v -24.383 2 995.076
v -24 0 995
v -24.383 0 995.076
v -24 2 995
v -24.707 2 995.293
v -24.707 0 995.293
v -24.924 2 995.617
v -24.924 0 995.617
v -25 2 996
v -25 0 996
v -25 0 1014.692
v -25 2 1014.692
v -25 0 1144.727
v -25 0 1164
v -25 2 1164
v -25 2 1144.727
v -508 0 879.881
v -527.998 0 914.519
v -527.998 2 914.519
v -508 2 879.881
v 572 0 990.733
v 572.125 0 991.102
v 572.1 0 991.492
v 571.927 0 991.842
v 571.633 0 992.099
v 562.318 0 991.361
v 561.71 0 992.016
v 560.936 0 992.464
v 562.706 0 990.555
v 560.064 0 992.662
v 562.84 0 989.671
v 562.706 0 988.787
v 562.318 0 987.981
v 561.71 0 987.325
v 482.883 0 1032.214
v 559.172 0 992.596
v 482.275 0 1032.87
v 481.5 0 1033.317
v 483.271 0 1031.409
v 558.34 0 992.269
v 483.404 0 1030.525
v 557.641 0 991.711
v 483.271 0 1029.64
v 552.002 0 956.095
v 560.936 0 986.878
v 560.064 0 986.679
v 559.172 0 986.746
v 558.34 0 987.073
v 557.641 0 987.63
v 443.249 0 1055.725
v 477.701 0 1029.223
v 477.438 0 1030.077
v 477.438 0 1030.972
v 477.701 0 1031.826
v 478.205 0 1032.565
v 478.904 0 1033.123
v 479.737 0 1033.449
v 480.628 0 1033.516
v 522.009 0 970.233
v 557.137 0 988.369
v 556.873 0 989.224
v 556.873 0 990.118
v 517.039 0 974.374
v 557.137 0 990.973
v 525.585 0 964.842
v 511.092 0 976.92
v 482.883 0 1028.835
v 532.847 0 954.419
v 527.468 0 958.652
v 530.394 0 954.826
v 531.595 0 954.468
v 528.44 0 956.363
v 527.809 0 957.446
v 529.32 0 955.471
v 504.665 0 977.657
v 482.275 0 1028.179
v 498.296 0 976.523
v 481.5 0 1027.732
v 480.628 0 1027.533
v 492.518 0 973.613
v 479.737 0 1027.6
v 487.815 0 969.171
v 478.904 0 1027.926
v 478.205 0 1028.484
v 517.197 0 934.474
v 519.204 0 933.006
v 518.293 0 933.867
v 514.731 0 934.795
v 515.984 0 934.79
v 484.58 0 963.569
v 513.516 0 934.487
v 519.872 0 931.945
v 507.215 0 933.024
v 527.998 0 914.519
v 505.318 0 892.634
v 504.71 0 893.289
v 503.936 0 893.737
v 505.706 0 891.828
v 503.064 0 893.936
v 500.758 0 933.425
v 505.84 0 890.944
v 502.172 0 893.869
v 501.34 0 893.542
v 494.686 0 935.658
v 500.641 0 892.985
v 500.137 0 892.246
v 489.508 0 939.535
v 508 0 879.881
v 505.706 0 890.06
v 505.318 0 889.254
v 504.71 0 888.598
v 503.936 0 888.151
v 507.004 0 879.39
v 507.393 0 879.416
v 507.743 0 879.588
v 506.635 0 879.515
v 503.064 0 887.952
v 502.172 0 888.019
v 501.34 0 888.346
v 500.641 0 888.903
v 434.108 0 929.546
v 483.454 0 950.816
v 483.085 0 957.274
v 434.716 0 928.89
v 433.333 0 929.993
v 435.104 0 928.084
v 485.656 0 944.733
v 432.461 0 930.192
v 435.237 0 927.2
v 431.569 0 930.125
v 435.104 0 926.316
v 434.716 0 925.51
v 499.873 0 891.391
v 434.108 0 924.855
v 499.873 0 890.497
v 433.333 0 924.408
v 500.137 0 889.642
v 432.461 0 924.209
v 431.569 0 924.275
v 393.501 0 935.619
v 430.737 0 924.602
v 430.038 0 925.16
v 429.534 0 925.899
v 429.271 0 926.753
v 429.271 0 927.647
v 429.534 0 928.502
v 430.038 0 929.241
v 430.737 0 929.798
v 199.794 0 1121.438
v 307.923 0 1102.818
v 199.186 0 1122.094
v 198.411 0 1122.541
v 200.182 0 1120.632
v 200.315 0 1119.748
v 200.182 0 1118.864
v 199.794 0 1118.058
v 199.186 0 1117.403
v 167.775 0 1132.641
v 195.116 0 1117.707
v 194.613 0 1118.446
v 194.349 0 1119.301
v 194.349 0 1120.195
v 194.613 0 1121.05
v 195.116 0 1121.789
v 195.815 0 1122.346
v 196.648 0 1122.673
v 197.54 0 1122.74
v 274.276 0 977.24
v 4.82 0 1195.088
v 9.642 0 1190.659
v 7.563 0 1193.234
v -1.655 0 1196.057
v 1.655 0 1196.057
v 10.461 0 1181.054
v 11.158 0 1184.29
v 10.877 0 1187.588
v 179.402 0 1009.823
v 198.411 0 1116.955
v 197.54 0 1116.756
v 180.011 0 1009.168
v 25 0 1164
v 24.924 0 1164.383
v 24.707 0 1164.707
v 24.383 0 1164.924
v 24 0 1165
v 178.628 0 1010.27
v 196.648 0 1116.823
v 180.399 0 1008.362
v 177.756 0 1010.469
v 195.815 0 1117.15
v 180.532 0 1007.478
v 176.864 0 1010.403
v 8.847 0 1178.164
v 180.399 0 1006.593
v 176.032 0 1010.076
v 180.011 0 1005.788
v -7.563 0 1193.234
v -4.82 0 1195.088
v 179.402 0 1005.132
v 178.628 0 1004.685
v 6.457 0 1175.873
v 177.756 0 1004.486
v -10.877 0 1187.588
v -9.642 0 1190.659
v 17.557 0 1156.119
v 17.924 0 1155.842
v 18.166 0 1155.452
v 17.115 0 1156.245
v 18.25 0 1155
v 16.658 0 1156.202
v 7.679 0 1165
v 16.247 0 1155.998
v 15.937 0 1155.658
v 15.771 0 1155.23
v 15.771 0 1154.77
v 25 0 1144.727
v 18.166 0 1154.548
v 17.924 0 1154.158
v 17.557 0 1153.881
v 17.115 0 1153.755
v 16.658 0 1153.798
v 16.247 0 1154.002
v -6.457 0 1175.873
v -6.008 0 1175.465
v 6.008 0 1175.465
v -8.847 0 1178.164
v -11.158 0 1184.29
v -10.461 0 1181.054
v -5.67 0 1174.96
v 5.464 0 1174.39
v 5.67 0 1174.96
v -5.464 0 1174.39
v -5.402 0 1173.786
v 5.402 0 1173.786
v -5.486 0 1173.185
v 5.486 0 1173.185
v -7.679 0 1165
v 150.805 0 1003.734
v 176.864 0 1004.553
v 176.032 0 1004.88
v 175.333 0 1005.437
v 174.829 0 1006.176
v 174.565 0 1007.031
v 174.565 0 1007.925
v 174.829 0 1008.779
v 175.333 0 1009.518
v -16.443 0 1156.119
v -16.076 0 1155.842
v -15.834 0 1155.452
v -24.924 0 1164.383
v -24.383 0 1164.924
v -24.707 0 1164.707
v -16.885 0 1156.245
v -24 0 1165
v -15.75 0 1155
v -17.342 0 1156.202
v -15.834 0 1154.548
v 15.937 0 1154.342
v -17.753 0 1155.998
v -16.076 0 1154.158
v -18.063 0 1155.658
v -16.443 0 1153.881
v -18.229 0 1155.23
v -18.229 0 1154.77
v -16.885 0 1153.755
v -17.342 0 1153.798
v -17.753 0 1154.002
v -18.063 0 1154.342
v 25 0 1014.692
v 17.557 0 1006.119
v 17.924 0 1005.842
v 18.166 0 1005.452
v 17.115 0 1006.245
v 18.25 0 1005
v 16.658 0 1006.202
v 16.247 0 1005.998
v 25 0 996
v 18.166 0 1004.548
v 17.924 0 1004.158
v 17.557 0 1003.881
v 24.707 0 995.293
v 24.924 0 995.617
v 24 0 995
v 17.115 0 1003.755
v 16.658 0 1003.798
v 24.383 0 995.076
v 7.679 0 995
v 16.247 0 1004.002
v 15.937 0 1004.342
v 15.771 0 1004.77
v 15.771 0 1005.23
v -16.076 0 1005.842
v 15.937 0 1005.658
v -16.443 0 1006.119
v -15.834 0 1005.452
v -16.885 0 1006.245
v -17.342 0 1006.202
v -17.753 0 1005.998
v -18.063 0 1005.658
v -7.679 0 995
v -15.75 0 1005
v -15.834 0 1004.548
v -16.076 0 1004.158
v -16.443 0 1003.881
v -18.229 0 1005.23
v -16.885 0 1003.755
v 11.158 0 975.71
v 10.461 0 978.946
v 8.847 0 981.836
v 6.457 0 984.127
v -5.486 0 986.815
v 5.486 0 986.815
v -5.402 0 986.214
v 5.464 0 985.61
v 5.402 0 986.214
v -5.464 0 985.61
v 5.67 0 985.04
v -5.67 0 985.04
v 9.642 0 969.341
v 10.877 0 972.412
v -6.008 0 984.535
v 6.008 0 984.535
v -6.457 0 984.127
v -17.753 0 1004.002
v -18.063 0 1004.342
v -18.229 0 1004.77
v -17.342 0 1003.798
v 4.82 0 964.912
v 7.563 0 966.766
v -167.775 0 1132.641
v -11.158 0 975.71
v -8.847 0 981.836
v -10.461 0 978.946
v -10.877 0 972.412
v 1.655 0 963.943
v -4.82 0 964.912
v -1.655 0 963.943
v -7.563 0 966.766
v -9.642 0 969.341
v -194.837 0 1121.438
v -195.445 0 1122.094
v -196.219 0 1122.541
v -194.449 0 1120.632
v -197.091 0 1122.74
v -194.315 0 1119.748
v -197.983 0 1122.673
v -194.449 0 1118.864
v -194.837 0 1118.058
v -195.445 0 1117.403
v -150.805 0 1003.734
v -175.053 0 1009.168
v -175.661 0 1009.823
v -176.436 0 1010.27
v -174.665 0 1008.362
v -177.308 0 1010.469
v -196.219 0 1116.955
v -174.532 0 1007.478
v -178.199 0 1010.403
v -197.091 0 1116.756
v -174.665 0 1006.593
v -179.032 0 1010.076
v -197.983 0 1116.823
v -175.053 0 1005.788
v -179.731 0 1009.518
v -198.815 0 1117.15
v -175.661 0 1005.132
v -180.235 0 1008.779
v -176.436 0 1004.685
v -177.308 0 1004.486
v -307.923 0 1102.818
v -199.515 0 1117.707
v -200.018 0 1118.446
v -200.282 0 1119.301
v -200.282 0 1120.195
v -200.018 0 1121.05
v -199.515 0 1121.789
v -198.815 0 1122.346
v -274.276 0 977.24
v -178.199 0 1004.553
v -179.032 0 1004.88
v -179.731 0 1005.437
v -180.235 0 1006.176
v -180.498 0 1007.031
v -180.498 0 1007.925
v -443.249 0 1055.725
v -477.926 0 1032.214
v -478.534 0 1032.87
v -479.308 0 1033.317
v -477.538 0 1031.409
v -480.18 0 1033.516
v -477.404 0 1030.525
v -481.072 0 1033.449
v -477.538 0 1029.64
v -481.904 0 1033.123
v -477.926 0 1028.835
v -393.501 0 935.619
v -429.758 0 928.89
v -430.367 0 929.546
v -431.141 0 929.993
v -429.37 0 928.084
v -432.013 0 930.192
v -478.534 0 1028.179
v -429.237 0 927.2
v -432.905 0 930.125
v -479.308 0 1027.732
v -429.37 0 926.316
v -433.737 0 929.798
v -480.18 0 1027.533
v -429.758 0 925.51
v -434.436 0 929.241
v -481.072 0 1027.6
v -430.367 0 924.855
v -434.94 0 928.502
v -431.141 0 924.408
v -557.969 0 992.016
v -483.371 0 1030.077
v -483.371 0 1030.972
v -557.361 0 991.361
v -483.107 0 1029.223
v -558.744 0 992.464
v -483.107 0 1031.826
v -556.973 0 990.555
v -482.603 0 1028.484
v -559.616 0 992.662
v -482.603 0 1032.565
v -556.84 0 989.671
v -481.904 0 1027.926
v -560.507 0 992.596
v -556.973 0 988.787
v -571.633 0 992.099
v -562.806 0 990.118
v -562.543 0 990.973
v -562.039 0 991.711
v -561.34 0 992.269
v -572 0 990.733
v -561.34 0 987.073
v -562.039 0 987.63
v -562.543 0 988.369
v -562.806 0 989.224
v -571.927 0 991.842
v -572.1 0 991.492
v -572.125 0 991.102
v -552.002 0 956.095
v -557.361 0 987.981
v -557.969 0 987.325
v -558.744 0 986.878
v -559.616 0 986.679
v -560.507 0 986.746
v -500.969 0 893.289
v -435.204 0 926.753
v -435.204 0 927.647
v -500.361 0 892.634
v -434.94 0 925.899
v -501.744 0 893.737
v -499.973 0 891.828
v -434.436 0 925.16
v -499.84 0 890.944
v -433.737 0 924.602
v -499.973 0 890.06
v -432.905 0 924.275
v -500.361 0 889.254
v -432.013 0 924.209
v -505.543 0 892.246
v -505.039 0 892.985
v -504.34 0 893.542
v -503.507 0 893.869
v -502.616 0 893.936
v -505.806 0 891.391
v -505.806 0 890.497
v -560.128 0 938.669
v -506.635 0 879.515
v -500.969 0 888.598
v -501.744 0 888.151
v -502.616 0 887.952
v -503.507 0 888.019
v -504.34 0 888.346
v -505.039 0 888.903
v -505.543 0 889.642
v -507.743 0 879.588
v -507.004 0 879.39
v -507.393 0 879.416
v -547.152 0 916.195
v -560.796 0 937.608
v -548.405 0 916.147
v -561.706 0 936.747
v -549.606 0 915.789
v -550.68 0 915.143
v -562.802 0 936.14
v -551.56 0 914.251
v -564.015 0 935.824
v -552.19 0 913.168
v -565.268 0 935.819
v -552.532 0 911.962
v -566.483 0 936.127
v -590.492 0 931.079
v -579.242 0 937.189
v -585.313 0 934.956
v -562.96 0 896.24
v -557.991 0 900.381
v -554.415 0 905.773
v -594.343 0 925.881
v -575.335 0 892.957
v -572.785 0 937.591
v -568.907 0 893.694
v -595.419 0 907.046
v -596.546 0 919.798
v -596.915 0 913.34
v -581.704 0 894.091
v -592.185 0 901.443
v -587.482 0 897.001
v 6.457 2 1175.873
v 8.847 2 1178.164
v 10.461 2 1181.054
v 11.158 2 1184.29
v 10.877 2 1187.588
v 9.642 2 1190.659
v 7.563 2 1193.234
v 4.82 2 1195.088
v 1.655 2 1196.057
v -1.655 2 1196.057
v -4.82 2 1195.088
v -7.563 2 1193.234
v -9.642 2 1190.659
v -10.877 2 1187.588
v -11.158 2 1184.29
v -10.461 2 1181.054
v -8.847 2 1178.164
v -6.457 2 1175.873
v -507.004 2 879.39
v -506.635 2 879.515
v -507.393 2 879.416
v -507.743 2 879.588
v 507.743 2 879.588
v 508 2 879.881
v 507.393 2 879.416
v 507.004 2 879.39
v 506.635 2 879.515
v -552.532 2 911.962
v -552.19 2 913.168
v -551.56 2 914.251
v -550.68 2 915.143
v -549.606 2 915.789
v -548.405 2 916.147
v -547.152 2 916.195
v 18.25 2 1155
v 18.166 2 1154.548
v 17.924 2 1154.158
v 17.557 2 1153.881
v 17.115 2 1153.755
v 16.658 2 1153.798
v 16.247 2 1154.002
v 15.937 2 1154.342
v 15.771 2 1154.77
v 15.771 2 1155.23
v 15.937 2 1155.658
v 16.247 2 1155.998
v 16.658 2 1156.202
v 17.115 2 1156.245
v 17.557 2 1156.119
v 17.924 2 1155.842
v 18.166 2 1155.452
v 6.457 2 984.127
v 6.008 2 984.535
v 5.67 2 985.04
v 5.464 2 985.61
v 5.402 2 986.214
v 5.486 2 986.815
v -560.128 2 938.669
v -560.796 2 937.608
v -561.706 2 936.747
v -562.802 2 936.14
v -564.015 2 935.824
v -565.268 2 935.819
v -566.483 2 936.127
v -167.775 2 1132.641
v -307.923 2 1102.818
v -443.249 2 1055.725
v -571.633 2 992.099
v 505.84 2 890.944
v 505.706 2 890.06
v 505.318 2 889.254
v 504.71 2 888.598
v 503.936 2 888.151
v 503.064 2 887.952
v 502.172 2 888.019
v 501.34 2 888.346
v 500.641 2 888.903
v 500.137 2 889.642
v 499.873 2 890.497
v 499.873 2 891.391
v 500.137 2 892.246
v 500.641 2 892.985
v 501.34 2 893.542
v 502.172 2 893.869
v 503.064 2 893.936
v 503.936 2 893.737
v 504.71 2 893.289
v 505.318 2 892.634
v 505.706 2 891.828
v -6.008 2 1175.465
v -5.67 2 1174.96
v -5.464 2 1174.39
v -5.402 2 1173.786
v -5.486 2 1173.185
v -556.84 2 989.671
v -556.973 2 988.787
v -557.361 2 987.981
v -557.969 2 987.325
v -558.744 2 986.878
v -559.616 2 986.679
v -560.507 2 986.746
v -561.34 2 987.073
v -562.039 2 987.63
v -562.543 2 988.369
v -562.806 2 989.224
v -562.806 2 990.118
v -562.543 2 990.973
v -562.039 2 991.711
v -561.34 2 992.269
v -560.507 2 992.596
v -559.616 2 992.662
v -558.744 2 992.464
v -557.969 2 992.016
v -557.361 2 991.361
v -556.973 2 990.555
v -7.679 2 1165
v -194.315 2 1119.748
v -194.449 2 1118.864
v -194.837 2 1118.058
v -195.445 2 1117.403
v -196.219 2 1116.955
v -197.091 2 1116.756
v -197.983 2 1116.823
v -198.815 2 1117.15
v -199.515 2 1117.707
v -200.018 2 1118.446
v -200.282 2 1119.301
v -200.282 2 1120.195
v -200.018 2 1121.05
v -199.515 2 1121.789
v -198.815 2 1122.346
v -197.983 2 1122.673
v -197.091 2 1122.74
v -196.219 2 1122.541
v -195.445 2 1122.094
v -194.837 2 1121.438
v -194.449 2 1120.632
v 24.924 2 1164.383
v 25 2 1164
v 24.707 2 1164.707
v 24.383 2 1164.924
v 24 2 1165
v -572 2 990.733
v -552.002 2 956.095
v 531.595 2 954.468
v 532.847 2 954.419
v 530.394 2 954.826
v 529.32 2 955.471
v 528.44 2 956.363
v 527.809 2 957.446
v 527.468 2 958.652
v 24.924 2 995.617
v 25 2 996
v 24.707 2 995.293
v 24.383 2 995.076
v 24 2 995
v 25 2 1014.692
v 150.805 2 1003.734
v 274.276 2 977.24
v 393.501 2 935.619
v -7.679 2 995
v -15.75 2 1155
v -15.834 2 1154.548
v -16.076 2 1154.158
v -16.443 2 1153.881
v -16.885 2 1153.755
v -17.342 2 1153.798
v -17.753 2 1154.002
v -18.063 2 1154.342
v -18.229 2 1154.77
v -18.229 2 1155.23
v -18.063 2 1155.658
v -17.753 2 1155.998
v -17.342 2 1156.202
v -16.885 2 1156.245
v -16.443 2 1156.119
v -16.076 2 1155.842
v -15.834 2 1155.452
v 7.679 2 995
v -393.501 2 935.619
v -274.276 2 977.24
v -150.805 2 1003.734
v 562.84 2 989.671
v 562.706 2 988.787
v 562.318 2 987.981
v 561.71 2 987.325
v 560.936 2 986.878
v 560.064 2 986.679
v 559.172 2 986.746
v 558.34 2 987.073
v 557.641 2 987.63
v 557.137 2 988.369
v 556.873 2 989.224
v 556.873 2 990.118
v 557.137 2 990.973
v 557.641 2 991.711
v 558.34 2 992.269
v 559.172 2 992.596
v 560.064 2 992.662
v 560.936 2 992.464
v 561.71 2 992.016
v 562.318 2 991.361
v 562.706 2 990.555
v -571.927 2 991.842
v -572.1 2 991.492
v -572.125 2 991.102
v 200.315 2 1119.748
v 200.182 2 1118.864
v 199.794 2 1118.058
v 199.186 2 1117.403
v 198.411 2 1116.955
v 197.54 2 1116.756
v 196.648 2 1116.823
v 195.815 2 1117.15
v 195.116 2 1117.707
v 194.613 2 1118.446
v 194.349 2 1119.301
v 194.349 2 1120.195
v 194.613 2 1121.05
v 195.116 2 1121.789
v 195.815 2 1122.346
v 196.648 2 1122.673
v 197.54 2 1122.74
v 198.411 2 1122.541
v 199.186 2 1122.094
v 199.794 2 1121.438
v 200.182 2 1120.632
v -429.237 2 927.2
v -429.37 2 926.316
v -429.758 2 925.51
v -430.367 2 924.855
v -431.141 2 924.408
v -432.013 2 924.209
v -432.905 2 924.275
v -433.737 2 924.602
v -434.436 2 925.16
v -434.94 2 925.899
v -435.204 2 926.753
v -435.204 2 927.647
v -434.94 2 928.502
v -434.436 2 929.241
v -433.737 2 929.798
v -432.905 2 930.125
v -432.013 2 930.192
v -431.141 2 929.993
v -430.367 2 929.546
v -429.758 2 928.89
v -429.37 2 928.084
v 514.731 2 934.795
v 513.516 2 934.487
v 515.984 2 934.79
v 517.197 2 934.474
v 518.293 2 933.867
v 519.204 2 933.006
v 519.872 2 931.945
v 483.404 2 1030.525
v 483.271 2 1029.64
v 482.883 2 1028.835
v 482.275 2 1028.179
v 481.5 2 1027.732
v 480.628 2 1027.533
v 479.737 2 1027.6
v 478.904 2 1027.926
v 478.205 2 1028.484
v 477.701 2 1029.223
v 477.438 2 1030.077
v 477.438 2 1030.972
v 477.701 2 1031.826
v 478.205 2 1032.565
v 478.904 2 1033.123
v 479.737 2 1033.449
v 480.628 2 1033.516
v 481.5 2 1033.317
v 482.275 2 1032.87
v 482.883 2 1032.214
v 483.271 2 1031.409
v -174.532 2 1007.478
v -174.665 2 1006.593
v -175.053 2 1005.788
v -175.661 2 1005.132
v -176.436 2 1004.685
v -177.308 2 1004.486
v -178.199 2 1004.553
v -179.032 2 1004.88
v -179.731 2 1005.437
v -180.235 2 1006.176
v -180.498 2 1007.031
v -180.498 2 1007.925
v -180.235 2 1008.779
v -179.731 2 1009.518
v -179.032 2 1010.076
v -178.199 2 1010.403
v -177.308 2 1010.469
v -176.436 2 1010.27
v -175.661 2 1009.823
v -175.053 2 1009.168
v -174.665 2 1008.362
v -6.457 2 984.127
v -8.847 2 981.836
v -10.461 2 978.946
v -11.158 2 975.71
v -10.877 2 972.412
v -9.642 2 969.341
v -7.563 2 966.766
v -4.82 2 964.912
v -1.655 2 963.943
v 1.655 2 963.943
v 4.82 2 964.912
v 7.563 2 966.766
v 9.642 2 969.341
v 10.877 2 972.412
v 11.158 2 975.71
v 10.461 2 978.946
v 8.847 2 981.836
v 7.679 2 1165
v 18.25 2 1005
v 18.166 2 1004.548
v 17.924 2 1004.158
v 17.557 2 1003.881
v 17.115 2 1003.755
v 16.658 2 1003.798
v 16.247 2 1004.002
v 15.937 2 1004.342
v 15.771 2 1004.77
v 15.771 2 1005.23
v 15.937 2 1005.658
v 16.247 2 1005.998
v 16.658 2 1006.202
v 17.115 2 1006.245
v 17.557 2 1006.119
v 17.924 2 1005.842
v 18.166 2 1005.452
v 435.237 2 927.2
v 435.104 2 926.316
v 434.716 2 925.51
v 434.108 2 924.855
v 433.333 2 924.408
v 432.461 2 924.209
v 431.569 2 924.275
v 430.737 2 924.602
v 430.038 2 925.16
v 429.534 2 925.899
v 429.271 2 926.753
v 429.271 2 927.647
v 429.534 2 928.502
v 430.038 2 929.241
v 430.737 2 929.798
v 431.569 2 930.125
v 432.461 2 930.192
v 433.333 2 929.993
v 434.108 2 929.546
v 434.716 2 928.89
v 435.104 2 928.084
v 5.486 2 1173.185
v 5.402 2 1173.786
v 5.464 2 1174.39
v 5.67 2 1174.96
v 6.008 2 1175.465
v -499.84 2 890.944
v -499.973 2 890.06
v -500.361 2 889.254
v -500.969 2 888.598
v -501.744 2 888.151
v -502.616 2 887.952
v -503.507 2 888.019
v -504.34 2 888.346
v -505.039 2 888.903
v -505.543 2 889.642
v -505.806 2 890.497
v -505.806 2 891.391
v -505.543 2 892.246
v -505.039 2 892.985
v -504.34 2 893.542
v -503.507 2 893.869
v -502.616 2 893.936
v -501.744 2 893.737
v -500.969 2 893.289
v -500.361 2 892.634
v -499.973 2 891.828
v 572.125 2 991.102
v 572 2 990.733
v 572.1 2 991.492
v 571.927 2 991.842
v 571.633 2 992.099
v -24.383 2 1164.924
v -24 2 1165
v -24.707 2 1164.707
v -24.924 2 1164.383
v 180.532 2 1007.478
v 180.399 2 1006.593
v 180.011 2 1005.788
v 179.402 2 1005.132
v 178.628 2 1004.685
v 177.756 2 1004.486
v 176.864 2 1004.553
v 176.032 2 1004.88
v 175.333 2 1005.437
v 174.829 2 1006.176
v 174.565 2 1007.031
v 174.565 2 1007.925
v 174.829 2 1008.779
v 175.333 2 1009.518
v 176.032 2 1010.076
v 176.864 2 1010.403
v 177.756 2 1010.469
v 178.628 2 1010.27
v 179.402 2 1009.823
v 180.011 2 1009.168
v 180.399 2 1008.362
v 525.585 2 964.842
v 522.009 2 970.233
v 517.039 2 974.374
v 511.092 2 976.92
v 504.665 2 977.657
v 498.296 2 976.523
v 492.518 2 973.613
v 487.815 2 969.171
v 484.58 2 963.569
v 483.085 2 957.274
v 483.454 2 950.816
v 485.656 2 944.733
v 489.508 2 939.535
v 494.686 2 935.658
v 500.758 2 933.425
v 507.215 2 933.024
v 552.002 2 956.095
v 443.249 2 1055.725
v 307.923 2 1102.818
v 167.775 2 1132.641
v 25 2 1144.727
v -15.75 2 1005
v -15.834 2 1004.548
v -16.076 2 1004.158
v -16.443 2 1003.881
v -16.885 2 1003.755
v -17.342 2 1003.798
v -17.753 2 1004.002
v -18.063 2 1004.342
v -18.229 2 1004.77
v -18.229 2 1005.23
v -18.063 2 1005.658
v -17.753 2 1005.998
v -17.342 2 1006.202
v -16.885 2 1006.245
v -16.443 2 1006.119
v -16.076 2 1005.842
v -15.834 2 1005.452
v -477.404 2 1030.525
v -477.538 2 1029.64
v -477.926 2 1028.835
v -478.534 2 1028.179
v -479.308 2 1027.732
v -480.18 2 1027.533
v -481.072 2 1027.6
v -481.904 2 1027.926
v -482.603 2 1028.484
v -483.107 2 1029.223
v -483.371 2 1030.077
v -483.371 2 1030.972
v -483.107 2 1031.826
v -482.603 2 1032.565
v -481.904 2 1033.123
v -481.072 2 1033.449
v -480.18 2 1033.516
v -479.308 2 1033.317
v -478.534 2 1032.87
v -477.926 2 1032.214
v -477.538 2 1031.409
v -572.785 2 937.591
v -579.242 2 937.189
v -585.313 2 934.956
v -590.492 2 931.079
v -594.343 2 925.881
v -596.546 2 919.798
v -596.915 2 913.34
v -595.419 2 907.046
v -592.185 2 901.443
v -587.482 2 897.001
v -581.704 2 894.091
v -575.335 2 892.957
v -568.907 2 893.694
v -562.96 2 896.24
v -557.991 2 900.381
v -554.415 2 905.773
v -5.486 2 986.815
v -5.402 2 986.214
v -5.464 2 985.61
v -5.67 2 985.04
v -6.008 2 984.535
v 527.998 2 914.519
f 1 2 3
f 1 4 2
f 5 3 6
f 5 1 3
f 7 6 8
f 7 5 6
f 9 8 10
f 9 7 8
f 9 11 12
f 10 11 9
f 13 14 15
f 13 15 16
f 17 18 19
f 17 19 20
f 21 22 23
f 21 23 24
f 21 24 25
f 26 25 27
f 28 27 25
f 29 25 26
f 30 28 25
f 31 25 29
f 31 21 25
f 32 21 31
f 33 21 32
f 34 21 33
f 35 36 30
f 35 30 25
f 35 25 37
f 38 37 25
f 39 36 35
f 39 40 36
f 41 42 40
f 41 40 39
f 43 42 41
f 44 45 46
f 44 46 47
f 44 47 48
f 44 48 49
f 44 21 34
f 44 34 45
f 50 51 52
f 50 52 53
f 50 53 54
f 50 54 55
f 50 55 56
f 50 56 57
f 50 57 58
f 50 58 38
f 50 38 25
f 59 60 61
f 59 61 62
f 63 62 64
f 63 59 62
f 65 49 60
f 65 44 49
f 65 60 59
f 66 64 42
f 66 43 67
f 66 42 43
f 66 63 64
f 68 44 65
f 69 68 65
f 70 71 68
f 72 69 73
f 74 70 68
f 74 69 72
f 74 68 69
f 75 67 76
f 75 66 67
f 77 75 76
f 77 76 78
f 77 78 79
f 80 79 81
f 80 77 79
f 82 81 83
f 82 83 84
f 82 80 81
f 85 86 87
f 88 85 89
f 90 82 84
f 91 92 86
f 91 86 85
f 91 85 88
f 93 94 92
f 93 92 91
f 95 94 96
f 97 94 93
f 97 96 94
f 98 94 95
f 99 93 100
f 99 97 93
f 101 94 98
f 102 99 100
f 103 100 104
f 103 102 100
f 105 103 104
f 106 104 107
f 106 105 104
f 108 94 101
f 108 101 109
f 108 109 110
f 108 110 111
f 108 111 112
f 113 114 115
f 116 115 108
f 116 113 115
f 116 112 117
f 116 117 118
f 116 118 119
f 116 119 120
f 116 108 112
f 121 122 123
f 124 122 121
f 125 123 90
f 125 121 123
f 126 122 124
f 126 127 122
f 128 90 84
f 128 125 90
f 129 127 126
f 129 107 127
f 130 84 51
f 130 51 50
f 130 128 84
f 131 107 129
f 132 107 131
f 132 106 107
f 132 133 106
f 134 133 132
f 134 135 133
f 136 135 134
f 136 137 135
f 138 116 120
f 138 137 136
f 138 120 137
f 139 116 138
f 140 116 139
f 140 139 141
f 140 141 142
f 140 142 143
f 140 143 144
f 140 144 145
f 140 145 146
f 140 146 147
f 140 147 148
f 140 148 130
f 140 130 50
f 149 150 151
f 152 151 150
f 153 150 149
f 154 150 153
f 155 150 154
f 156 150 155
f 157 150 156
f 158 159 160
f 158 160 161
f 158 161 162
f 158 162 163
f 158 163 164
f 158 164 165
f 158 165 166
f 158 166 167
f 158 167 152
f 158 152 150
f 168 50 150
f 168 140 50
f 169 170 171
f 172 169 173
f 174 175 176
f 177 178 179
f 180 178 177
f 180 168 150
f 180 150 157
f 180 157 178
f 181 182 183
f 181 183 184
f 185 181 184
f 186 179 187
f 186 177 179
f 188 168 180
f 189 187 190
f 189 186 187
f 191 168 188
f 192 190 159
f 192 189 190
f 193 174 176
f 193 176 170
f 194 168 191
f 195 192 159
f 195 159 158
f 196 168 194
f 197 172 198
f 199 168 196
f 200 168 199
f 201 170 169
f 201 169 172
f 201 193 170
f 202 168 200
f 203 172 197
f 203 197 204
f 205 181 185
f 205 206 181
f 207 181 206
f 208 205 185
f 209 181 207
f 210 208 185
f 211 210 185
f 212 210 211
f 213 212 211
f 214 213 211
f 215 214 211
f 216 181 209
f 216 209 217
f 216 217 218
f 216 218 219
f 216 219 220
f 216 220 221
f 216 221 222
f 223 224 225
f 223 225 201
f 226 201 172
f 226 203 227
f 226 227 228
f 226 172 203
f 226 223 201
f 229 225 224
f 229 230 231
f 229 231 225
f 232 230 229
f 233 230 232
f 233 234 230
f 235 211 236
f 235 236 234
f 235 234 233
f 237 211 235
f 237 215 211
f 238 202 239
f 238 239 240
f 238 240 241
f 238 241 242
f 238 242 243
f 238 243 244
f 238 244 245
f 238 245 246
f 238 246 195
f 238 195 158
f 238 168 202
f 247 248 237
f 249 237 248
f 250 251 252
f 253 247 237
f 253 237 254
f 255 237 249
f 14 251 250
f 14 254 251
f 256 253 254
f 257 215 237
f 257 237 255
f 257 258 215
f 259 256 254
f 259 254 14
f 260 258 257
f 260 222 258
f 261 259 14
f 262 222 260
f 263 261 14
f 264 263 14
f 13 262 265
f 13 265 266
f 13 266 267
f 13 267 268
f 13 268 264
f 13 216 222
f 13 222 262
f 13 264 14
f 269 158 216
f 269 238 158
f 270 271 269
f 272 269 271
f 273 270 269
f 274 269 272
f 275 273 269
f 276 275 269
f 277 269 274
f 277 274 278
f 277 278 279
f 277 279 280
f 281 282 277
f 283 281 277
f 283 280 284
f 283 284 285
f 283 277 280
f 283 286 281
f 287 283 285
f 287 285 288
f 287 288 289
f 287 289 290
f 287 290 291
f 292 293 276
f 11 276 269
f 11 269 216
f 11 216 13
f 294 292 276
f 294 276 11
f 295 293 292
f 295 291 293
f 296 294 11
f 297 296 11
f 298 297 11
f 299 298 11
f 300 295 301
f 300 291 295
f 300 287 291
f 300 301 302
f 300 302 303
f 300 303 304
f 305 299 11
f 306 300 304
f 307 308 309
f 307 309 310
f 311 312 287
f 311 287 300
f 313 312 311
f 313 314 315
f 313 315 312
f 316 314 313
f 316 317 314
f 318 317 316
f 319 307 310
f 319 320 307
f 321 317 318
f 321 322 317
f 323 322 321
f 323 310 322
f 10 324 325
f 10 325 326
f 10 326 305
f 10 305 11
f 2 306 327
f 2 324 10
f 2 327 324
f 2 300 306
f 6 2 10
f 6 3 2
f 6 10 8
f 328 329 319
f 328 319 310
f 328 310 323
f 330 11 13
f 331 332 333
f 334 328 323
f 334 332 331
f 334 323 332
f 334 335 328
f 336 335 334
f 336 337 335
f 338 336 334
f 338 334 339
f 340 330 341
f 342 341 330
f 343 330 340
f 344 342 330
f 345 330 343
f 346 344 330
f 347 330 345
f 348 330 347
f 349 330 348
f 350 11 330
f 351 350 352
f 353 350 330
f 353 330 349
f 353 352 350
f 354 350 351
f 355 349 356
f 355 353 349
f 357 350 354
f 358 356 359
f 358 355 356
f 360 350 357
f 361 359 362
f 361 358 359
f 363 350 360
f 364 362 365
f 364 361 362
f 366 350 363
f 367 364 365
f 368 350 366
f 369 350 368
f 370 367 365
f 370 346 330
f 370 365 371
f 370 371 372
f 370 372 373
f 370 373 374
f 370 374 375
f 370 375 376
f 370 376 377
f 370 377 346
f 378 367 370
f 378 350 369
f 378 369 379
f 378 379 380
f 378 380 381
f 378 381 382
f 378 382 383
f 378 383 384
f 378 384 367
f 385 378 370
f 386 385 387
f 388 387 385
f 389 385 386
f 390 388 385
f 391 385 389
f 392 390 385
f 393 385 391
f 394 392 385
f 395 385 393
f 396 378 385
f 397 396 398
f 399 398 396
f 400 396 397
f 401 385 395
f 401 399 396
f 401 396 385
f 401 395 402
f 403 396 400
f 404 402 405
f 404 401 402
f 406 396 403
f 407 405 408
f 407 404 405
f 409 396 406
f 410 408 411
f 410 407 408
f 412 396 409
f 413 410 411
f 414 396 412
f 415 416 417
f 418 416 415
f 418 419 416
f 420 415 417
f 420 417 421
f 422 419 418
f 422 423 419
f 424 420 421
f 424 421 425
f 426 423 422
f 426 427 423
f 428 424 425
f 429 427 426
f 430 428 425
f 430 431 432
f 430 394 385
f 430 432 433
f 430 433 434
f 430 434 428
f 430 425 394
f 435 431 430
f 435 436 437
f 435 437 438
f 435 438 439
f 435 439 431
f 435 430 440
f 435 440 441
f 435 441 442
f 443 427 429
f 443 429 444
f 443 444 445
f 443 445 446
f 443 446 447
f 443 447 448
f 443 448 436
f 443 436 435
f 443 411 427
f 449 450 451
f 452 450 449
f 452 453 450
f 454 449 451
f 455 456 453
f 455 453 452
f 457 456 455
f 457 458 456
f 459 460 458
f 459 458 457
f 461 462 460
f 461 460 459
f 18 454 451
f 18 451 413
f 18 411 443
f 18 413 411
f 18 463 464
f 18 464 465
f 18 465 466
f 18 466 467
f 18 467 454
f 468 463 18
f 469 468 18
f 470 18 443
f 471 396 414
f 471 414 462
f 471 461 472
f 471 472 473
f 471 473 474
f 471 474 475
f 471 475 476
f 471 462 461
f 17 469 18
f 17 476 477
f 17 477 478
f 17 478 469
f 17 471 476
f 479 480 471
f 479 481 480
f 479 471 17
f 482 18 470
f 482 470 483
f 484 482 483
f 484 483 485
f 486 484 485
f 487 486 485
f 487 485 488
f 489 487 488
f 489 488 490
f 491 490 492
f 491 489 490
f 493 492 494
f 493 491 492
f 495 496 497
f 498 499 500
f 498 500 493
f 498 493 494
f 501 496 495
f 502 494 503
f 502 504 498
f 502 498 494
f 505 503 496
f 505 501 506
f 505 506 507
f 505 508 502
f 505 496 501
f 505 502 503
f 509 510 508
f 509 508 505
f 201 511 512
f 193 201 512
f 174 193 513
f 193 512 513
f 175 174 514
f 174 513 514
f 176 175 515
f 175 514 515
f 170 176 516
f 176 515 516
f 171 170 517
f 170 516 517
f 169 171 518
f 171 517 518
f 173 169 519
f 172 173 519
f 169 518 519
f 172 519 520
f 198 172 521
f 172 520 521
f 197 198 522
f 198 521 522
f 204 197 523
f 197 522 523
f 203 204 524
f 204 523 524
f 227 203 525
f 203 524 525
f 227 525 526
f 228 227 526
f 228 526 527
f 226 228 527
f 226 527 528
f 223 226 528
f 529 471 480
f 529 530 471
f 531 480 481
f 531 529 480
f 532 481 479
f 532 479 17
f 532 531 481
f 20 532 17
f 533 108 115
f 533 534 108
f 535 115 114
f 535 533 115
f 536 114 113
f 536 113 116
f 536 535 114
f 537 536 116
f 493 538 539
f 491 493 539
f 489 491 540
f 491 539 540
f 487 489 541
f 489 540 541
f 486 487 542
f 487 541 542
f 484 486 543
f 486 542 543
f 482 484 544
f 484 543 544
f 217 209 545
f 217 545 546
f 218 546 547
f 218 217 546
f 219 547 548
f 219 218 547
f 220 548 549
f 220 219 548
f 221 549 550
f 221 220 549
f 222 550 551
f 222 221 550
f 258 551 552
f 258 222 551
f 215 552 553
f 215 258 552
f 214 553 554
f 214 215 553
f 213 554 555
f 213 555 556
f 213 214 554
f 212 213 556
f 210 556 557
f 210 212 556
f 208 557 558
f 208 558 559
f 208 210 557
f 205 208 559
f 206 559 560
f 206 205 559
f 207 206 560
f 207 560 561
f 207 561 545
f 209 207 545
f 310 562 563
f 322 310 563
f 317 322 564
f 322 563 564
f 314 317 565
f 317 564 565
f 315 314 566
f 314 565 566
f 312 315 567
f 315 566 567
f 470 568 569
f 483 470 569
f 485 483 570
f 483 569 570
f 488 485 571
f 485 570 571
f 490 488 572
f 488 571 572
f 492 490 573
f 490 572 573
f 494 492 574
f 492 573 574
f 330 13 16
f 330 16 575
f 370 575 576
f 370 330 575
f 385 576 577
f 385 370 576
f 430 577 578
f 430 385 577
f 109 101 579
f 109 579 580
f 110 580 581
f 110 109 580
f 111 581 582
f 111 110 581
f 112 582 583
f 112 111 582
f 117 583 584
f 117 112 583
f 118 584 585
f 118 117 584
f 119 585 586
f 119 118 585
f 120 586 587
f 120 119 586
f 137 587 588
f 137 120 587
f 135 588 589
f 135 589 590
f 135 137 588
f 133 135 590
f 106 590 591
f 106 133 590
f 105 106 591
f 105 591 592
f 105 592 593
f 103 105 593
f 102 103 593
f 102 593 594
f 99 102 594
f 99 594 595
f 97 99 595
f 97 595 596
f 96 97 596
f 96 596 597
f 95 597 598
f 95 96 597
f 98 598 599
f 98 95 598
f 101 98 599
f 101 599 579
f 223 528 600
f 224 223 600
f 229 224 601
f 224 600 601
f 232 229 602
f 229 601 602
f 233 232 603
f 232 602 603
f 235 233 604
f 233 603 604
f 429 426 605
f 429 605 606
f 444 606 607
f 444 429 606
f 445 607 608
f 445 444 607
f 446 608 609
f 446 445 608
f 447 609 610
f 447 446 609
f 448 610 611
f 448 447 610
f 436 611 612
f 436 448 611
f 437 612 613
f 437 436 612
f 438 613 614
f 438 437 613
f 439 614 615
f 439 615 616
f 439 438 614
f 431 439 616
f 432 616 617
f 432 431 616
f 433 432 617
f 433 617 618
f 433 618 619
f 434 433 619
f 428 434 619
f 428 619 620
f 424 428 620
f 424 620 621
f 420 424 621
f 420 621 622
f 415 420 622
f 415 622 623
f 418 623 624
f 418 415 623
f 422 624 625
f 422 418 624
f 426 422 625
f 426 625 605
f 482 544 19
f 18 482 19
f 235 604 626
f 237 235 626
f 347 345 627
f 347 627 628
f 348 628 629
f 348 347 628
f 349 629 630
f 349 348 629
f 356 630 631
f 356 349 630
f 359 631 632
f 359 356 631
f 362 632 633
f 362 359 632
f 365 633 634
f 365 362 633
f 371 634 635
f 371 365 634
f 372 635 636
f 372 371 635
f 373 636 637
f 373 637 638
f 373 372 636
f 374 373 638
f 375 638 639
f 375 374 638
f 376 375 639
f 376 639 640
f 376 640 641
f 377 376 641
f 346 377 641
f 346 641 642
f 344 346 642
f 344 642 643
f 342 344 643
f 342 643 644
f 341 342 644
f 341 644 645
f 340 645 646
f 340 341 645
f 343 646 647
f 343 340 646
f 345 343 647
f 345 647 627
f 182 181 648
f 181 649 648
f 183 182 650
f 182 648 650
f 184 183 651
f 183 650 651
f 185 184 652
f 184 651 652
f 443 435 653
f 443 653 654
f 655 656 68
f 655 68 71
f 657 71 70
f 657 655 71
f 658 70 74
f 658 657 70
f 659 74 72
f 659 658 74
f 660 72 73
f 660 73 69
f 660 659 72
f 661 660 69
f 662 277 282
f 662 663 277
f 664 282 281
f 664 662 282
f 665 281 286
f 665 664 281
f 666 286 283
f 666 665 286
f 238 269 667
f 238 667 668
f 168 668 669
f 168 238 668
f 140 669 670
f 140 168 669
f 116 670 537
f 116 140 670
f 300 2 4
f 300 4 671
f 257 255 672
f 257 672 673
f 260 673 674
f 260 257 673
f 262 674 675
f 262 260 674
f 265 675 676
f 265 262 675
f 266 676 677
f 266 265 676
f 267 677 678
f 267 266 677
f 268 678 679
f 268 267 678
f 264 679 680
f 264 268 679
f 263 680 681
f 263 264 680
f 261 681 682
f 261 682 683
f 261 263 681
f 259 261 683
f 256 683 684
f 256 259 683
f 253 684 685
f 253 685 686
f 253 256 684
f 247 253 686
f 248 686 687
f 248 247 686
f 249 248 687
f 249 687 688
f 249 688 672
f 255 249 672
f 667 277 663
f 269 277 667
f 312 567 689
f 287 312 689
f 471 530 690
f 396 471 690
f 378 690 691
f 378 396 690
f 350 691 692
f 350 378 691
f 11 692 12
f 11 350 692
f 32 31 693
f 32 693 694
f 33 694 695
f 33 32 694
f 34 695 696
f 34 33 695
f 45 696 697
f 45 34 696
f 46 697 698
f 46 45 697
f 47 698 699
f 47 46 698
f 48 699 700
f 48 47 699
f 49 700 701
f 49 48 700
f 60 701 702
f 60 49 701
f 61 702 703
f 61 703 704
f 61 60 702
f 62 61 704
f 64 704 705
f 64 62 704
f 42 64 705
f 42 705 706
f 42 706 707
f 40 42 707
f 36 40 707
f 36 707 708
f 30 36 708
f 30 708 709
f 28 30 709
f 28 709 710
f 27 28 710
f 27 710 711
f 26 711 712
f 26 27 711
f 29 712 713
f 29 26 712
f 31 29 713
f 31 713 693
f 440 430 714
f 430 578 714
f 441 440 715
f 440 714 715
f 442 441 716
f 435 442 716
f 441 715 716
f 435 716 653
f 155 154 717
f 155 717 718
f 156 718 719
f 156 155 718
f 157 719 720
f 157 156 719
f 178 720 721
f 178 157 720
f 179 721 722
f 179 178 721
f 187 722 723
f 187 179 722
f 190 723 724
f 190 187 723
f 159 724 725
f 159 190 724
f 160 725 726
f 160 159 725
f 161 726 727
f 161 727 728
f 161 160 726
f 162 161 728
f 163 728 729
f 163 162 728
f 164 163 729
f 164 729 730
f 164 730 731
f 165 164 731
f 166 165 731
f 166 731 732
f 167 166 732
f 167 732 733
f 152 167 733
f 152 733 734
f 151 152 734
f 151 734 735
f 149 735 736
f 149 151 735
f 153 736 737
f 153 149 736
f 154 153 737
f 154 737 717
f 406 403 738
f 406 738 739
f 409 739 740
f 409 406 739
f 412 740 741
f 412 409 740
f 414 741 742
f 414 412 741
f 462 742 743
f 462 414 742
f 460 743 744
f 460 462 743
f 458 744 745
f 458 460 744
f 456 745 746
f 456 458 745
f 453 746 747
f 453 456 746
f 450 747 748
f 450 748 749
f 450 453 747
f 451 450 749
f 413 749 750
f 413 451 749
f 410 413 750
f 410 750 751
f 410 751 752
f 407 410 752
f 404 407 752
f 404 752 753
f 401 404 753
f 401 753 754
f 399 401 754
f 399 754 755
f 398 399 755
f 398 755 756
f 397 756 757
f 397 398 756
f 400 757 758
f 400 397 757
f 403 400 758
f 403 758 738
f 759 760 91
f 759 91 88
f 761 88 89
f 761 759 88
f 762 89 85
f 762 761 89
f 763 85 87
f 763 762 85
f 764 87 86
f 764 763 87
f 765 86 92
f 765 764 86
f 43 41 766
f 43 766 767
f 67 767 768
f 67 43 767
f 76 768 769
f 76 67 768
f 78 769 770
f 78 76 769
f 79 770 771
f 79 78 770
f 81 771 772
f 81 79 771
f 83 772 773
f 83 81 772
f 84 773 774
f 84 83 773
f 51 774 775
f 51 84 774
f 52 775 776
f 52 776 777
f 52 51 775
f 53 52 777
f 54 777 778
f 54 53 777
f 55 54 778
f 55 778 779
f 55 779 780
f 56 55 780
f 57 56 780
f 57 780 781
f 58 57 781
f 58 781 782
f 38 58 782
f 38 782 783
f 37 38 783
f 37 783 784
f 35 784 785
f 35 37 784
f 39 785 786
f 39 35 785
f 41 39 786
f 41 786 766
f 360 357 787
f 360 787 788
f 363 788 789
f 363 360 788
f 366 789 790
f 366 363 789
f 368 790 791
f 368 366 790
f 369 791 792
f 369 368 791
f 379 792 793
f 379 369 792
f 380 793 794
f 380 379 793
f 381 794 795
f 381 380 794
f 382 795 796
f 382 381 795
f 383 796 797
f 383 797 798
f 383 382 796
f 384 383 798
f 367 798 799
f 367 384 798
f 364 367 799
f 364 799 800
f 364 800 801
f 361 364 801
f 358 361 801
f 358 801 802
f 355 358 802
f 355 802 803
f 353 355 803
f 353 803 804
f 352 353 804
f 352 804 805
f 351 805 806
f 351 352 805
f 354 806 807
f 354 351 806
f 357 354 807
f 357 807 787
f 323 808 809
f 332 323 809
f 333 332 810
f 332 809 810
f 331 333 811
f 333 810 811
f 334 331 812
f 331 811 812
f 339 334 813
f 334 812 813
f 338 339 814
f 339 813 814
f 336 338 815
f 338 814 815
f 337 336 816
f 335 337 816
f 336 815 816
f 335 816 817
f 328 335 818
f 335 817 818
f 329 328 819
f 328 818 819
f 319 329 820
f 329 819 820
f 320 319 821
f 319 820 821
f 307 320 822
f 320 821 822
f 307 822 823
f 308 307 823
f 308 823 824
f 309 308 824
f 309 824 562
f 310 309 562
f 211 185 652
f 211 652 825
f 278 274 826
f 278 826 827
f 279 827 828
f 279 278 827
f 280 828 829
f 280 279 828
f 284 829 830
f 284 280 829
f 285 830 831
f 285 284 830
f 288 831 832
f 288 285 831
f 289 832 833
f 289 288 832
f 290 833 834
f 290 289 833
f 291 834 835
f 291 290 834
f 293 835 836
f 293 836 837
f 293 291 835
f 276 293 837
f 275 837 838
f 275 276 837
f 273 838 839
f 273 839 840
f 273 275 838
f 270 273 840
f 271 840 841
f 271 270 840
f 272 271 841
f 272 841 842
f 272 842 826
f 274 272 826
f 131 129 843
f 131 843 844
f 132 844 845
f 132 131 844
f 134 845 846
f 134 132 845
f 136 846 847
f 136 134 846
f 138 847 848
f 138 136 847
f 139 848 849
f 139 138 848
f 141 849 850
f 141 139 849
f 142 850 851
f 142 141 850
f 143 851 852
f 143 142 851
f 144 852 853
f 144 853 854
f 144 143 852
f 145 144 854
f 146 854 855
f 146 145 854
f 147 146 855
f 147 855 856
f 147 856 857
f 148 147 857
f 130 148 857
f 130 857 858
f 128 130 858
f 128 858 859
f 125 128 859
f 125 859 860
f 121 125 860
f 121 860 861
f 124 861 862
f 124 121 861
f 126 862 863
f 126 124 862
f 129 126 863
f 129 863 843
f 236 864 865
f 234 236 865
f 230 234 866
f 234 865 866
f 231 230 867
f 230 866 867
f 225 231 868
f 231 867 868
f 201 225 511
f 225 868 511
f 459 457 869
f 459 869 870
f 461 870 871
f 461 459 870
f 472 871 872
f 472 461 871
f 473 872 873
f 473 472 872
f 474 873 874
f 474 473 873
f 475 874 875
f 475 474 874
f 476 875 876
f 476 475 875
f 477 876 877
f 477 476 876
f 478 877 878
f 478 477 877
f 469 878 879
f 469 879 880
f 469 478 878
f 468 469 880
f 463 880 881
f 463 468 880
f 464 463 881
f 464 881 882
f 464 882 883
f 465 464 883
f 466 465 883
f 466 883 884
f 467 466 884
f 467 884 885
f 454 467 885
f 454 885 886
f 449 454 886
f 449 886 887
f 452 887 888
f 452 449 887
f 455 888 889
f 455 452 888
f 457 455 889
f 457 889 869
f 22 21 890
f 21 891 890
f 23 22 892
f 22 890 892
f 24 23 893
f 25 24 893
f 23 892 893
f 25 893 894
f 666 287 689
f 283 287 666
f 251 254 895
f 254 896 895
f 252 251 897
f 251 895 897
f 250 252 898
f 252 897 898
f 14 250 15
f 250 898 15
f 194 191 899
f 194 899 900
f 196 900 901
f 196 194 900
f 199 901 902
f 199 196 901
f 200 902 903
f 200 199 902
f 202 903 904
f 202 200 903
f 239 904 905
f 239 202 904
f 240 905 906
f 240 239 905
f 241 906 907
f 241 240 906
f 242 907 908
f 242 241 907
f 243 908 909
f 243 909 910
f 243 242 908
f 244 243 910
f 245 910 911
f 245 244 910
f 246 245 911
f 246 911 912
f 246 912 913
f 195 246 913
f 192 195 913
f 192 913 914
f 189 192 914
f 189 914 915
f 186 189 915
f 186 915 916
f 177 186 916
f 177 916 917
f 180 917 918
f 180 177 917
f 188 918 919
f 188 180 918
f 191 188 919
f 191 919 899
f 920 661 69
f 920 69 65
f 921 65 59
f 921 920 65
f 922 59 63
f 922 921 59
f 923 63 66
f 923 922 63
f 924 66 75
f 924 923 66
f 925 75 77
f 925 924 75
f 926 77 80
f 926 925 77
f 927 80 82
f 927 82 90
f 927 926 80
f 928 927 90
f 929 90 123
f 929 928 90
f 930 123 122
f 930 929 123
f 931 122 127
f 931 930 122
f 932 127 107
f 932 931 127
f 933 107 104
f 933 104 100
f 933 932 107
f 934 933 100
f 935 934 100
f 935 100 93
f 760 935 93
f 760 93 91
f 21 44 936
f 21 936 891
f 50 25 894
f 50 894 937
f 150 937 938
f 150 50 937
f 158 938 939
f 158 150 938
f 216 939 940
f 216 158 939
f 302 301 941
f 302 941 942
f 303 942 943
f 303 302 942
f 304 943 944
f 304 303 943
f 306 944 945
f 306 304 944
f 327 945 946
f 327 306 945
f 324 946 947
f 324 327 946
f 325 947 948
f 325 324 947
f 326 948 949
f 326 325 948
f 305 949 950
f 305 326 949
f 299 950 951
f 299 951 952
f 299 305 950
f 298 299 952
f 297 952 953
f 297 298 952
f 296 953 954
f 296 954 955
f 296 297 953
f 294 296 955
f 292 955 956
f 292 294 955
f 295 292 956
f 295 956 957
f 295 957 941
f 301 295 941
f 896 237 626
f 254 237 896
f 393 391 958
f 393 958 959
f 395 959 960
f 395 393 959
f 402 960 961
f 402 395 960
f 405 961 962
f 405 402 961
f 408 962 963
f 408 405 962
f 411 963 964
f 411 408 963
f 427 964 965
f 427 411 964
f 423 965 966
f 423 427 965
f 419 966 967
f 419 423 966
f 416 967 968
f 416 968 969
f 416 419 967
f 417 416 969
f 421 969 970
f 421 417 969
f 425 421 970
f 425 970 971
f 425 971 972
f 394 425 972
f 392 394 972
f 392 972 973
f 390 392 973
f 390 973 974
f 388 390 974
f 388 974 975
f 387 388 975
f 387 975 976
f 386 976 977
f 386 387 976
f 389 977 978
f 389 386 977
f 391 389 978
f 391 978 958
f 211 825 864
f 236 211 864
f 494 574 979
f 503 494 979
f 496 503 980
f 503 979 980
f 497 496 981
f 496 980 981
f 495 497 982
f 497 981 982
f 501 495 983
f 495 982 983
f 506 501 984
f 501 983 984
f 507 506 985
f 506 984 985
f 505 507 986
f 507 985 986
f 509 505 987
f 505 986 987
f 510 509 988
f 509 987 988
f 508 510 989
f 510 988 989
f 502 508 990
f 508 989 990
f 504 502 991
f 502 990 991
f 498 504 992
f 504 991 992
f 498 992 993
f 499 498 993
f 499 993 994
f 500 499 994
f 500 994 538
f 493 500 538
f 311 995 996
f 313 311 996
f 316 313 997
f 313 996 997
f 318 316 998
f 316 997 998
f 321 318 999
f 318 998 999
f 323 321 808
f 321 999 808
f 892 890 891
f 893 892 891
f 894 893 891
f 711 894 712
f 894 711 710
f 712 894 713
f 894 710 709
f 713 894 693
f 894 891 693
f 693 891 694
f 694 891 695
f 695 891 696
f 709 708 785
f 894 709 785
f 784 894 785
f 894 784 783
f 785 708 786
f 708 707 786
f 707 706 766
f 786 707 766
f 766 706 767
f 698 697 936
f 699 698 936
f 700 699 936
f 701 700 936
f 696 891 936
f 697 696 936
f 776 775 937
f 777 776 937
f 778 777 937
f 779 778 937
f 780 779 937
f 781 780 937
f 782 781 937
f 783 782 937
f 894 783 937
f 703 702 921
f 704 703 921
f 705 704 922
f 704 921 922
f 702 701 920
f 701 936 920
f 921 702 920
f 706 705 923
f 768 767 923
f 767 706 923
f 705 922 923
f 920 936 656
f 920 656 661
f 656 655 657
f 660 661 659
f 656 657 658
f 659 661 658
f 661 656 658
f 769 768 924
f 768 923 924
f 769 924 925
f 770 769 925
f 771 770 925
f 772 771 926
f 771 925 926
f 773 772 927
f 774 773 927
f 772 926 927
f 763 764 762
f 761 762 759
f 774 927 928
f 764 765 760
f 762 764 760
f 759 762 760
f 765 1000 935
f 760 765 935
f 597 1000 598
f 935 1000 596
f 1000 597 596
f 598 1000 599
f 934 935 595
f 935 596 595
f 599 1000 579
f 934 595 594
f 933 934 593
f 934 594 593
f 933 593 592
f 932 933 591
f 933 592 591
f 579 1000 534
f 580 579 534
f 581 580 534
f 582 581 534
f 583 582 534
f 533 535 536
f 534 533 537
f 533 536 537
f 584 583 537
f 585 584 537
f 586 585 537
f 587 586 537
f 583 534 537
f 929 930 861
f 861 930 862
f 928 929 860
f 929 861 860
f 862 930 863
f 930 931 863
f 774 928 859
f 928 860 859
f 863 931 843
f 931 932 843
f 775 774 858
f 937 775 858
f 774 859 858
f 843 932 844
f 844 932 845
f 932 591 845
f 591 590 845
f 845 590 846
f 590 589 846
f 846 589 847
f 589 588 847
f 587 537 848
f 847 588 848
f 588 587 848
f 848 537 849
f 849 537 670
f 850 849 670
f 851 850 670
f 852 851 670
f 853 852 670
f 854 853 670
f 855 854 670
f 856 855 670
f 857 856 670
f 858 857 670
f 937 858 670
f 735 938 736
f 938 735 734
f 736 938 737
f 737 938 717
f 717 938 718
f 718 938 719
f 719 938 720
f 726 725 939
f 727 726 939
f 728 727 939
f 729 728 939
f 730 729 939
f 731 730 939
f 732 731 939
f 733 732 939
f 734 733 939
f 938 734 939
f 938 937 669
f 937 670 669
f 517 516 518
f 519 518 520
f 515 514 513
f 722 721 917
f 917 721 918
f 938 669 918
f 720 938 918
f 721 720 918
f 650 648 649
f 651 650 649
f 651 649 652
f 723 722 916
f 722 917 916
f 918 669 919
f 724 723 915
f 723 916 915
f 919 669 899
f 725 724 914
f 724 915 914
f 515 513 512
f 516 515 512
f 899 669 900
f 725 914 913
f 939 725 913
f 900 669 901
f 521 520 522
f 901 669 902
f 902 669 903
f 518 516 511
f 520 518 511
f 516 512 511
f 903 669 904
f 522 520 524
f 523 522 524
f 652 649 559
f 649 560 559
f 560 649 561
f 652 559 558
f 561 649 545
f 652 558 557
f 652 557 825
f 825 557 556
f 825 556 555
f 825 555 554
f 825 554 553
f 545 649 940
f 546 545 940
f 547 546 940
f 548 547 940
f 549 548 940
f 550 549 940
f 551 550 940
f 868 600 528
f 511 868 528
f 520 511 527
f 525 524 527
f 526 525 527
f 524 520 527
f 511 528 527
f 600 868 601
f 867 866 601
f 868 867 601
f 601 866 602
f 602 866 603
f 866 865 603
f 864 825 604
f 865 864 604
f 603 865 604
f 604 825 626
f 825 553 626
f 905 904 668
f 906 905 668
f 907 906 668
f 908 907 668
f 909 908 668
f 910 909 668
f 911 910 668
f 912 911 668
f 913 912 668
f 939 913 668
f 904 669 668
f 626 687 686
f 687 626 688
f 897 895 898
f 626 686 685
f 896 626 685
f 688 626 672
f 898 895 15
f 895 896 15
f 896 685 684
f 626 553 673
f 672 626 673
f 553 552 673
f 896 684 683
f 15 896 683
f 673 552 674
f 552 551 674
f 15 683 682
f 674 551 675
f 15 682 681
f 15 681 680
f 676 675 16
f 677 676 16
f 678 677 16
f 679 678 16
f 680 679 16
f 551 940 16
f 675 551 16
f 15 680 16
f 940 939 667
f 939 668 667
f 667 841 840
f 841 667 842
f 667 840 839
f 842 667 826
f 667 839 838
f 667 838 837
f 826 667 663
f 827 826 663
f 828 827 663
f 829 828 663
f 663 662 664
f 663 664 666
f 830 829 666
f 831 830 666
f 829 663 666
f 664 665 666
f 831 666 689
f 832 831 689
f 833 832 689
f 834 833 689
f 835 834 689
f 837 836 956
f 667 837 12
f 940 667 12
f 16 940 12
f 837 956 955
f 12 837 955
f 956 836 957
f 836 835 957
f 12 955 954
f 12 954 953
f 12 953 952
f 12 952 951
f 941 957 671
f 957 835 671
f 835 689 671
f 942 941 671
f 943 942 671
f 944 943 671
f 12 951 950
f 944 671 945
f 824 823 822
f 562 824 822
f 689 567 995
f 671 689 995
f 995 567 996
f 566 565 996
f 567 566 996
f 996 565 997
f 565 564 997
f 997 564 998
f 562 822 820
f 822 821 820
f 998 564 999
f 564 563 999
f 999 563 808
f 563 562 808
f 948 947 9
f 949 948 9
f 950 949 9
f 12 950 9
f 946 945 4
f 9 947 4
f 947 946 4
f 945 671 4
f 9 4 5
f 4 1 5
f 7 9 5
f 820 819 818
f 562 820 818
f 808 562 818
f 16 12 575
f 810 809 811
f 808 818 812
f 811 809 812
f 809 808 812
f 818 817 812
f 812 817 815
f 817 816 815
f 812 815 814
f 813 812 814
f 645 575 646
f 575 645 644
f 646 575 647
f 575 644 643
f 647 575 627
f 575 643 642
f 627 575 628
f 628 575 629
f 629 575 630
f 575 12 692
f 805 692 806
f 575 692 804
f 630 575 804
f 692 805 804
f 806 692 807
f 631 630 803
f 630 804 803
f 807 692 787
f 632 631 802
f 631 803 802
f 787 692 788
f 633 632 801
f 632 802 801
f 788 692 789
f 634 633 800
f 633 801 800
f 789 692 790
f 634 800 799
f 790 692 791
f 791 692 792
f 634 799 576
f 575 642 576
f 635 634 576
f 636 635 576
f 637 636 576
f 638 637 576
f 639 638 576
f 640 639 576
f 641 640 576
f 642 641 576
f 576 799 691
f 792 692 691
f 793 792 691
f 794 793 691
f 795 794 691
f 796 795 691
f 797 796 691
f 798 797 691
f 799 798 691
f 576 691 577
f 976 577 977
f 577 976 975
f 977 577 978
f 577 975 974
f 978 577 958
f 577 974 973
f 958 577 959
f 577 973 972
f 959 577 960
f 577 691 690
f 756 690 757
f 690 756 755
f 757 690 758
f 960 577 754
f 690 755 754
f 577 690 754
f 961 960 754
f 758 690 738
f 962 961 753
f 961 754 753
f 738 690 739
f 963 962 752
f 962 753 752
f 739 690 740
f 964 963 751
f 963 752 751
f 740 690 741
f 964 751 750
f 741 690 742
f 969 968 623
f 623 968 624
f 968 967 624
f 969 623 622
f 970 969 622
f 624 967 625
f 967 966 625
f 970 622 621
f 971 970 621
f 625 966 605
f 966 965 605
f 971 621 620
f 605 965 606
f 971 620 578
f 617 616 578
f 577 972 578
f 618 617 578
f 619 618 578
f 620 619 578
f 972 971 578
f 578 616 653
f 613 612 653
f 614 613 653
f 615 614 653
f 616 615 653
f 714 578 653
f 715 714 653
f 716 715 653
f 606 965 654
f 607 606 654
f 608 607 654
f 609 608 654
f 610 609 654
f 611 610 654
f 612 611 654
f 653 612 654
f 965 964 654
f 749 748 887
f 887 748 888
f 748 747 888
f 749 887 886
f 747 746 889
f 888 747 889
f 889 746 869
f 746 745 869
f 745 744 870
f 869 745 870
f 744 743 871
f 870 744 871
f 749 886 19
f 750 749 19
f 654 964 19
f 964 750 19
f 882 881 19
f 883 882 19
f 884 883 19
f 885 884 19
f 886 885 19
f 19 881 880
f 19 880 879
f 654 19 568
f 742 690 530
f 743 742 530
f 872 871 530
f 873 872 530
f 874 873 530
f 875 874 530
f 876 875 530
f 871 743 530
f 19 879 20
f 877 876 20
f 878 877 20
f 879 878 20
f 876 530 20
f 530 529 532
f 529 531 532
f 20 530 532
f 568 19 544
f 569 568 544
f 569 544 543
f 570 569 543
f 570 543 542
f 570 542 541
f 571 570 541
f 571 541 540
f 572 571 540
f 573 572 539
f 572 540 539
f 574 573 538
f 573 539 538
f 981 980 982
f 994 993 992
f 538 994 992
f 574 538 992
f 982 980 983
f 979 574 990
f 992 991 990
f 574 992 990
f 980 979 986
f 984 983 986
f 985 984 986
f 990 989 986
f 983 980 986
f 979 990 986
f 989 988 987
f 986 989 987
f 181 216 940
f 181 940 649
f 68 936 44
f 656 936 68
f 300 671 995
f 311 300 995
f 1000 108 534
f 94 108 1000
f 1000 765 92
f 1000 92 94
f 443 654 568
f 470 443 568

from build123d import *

# Parameters (mm, degrees)
SKETCH1_R           = 1.25
SKETCH1_R_2         = 3
BOSS_EXTRUDE2_DEPTH = 2
FILLET1_R           = 1
CUT_EXTRUDE1_DEPTH  = 2
BOSS_EXTRUDE3_DEPTH = 2


with BuildPart() as part:
    # Sketch1 → Boss-Extrude2 (new body)
    with BuildSketch(Plane(origin=(0, 0, 0), x_dir=(1, 0, 0), z_dir=(0, 1, 0))):
        with BuildLine():
            Line((507.5, -879.015784841), (572.5, -991.599087333))
            ThreePointArc((572.5, -991.599087333), (308.404936897, -1102.683723875), (25, -1144.7270417))
            Line((25, -1144.7270417), (25, -1165))
            Line((25, -1165), (-25, -1165))
            Line((-25, -1165), (-25, -1144.7270417))
            ThreePointArc((-25, -1144.7270417), (-308.404936897, -1102.683723875), (-572.5, -991.599087333))
            Line((-572.5, -991.599087333), (-507.5, -879.015784841))
            ThreePointArc((-507.5, -879.015784841), (-274.756394269, -977.104868378), (-25, -1014.692071517))
            Line((-25, -1014.692071517), (-25, -995))
            Line((-25, -995), (25, -995))
            Line((25, -995), (25, -1014.692071517))
            ThreePointArc((25, -1014.692071517), (274.756394269, -977.104868378), (507.5, -879.015784841))
        make_face()
        with Locations((-17, -1005)):
            Circle(SKETCH1_R, mode=Mode.SUBTRACT)
        with Locations((17, -1005)):
            Circle(SKETCH1_R, mode=Mode.SUBTRACT)
        with Locations((502.839745962, -890.943988071)):
            Circle(SKETCH1_R_2, mode=Mode.SUBTRACT)
        with Locations((559.839745962, -989.670884103)):
            Circle(SKETCH1_R_2, mode=Mode.SUBTRACT)
        with Locations((480.404221067, -1030.524519059)):
            Circle(SKETCH1_R_2, mode=Mode.SUBTRACT)
        with Locations((432.237043229, -927.200160947)):
            Circle(SKETCH1_R_2, mode=Mode.SUBTRACT)
        with Locations((-17, -1155)):
            Circle(SKETCH1_R, mode=Mode.SUBTRACT)
        with Locations((17, -1155)):
            Circle(SKETCH1_R, mode=Mode.SUBTRACT)
        with Locations((177.531862859, -1007.477760385)):
            Circle(SKETCH1_R_2, mode=Mode.SUBTRACT)
        with Locations((197.315472209, -1119.748009343)):
            Circle(SKETCH1_R_2, mode=Mode.SUBTRACT)
        with Locations((-559.839745962, -989.670884103)):
            Circle(SKETCH1_R_2, mode=Mode.SUBTRACT)
        with Locations((-502.839745962, -890.943988071)):
            Circle(SKETCH1_R_2, mode=Mode.SUBTRACT)
        with Locations((-480.404221067, -1030.524519059)):
            Circle(SKETCH1_R_2, mode=Mode.SUBTRACT)
        with Locations((-432.237043229, -927.200160947)):
            Circle(SKETCH1_R_2, mode=Mode.SUBTRACT)
        with Locations((-197.315472209, -1119.748009343)):
            Circle(SKETCH1_R_2, mode=Mode.SUBTRACT)
        with Locations((-177.531862859, -1007.477760385)):
            Circle(SKETCH1_R_2, mode=Mode.SUBTRACT)
    extrude(amount=BOSS_EXTRUDE2_DEPTH)

    # Fillet1
    fillet1_edges = [part.edges().sort_by_distance(p)[0] for p in [
        (25, 1, 1165),
        (-25, 1, 1165),
        (-572.5, 1, 991.599087333),
        (-507.5, 1, 879.015784841),
        (-25, 1, 995),
        (25, 1, 995),
        (507.5, 1, 879.015784841),
        (572.5, 1, 991.599087333),
    ]]
    fillet(fillet1_edges, radius=FILLET1_R)

    # Sketch3 → Cut-Extrude1 (cut)
    with BuildSketch(Plane(origin=(0, 2, 0), x_dir=(1, 0, 0), z_dir=(0, 1, 0))):
        with BuildLine():
            Line((519.871701126, -931.945073732), (527.997692321, -914.518829378))
            Line((527.997692321, -914.518829378), (552.001843085, -956.095238095))
            Line((552.001843085, -956.095238095), (532.847277184, -954.419430724))
            ThreePointArc((532.847277184, -954.419430724), (529.319600421, -955.471006493), (527.467771352, -958.652365329))
            ThreePointArc((527.467771352, -958.652365329), (485.99383482, -966.487373624), (513.516119308, -934.48739514))
            ThreePointArc((513.516119308, -934.48739514), (517.197171414, -934.474343541), (519.871701126, -931.945073732))
        make_face()
    extrude(amount=-CUT_EXTRUDE1_DEPTH, mode=Mode.SUBTRACT)

    # Sketch4 → Boss-Extrude3 (add)
    with BuildSketch(Plane(origin=(0, 2, 0), x_dir=(1, 0, 0), z_dir=(0, 1, 0))):
        with BuildLine():
            Line((-547.152258221, -916.194636749), (-527.997692321, -914.518829378))
            Line((-527.997692321, -914.518829378), (-552.001843085, -956.095238095))
            Line((-552.001843085, -956.095238095), (-560.12783428, -938.668993741))
            ThreePointArc((-560.12783428, -938.668993741), (-562.802363992, -936.139723932), (-566.483416097, -936.126672333))
            ThreePointArc((-566.483416097, -936.126672333), (-594.005700585, -904.126693849), (-552.531764054, -911.961702144))
            ThreePointArc((-552.531764054, -911.961702144), (-550.679934984, -915.14306098), (-547.152258221, -916.194636749))
        make_face()
        with BuildLine():
            Line((5.48633271, -986.815018385), (7.679491924, -995))
            Line((7.679491924, -995), (-7.679491924, -995))
            Line((-7.679491924, -995), (-5.48633271, -986.815018385))
            ThreePointArc((-5.48633271, -986.815018385), (-5.549842721, -985.31863757), (-6.457260037, -984.127091147))
            ThreePointArc((-6.457260037, -984.127091147), (0, -963.819660113), (6.457260037, -984.127091147))
            ThreePointArc((6.457260037, -984.127091147), (5.549842721, -985.31863757), (5.48633271, -986.815018385))
        make_face()
        with BuildLine():
            Line((-7.679491924, -1165), (7.679491924, -1165))
            Line((7.679491924, -1165), (5.48633271, -1173.184981615))
            ThreePointArc((5.48633271, -1173.184981615), (5.549842721, -1174.68136243), (6.457260037, -1175.872908853))
            ThreePointArc((6.457260037, -1175.872908853), (0, -1196.180339887), (-6.457260037, -1175.872908853))
            ThreePointArc((-6.457260037, -1175.872908853), (-5.549842721, -1174.68136243), (-5.48633271, -1173.184981615))
            Line((-5.48633271, -1173.184981615), (-7.679491924, -1165))
        make_face()
    extrude(amount=-BOSS_EXTRUDE3_DEPTH)


solid = part.part
